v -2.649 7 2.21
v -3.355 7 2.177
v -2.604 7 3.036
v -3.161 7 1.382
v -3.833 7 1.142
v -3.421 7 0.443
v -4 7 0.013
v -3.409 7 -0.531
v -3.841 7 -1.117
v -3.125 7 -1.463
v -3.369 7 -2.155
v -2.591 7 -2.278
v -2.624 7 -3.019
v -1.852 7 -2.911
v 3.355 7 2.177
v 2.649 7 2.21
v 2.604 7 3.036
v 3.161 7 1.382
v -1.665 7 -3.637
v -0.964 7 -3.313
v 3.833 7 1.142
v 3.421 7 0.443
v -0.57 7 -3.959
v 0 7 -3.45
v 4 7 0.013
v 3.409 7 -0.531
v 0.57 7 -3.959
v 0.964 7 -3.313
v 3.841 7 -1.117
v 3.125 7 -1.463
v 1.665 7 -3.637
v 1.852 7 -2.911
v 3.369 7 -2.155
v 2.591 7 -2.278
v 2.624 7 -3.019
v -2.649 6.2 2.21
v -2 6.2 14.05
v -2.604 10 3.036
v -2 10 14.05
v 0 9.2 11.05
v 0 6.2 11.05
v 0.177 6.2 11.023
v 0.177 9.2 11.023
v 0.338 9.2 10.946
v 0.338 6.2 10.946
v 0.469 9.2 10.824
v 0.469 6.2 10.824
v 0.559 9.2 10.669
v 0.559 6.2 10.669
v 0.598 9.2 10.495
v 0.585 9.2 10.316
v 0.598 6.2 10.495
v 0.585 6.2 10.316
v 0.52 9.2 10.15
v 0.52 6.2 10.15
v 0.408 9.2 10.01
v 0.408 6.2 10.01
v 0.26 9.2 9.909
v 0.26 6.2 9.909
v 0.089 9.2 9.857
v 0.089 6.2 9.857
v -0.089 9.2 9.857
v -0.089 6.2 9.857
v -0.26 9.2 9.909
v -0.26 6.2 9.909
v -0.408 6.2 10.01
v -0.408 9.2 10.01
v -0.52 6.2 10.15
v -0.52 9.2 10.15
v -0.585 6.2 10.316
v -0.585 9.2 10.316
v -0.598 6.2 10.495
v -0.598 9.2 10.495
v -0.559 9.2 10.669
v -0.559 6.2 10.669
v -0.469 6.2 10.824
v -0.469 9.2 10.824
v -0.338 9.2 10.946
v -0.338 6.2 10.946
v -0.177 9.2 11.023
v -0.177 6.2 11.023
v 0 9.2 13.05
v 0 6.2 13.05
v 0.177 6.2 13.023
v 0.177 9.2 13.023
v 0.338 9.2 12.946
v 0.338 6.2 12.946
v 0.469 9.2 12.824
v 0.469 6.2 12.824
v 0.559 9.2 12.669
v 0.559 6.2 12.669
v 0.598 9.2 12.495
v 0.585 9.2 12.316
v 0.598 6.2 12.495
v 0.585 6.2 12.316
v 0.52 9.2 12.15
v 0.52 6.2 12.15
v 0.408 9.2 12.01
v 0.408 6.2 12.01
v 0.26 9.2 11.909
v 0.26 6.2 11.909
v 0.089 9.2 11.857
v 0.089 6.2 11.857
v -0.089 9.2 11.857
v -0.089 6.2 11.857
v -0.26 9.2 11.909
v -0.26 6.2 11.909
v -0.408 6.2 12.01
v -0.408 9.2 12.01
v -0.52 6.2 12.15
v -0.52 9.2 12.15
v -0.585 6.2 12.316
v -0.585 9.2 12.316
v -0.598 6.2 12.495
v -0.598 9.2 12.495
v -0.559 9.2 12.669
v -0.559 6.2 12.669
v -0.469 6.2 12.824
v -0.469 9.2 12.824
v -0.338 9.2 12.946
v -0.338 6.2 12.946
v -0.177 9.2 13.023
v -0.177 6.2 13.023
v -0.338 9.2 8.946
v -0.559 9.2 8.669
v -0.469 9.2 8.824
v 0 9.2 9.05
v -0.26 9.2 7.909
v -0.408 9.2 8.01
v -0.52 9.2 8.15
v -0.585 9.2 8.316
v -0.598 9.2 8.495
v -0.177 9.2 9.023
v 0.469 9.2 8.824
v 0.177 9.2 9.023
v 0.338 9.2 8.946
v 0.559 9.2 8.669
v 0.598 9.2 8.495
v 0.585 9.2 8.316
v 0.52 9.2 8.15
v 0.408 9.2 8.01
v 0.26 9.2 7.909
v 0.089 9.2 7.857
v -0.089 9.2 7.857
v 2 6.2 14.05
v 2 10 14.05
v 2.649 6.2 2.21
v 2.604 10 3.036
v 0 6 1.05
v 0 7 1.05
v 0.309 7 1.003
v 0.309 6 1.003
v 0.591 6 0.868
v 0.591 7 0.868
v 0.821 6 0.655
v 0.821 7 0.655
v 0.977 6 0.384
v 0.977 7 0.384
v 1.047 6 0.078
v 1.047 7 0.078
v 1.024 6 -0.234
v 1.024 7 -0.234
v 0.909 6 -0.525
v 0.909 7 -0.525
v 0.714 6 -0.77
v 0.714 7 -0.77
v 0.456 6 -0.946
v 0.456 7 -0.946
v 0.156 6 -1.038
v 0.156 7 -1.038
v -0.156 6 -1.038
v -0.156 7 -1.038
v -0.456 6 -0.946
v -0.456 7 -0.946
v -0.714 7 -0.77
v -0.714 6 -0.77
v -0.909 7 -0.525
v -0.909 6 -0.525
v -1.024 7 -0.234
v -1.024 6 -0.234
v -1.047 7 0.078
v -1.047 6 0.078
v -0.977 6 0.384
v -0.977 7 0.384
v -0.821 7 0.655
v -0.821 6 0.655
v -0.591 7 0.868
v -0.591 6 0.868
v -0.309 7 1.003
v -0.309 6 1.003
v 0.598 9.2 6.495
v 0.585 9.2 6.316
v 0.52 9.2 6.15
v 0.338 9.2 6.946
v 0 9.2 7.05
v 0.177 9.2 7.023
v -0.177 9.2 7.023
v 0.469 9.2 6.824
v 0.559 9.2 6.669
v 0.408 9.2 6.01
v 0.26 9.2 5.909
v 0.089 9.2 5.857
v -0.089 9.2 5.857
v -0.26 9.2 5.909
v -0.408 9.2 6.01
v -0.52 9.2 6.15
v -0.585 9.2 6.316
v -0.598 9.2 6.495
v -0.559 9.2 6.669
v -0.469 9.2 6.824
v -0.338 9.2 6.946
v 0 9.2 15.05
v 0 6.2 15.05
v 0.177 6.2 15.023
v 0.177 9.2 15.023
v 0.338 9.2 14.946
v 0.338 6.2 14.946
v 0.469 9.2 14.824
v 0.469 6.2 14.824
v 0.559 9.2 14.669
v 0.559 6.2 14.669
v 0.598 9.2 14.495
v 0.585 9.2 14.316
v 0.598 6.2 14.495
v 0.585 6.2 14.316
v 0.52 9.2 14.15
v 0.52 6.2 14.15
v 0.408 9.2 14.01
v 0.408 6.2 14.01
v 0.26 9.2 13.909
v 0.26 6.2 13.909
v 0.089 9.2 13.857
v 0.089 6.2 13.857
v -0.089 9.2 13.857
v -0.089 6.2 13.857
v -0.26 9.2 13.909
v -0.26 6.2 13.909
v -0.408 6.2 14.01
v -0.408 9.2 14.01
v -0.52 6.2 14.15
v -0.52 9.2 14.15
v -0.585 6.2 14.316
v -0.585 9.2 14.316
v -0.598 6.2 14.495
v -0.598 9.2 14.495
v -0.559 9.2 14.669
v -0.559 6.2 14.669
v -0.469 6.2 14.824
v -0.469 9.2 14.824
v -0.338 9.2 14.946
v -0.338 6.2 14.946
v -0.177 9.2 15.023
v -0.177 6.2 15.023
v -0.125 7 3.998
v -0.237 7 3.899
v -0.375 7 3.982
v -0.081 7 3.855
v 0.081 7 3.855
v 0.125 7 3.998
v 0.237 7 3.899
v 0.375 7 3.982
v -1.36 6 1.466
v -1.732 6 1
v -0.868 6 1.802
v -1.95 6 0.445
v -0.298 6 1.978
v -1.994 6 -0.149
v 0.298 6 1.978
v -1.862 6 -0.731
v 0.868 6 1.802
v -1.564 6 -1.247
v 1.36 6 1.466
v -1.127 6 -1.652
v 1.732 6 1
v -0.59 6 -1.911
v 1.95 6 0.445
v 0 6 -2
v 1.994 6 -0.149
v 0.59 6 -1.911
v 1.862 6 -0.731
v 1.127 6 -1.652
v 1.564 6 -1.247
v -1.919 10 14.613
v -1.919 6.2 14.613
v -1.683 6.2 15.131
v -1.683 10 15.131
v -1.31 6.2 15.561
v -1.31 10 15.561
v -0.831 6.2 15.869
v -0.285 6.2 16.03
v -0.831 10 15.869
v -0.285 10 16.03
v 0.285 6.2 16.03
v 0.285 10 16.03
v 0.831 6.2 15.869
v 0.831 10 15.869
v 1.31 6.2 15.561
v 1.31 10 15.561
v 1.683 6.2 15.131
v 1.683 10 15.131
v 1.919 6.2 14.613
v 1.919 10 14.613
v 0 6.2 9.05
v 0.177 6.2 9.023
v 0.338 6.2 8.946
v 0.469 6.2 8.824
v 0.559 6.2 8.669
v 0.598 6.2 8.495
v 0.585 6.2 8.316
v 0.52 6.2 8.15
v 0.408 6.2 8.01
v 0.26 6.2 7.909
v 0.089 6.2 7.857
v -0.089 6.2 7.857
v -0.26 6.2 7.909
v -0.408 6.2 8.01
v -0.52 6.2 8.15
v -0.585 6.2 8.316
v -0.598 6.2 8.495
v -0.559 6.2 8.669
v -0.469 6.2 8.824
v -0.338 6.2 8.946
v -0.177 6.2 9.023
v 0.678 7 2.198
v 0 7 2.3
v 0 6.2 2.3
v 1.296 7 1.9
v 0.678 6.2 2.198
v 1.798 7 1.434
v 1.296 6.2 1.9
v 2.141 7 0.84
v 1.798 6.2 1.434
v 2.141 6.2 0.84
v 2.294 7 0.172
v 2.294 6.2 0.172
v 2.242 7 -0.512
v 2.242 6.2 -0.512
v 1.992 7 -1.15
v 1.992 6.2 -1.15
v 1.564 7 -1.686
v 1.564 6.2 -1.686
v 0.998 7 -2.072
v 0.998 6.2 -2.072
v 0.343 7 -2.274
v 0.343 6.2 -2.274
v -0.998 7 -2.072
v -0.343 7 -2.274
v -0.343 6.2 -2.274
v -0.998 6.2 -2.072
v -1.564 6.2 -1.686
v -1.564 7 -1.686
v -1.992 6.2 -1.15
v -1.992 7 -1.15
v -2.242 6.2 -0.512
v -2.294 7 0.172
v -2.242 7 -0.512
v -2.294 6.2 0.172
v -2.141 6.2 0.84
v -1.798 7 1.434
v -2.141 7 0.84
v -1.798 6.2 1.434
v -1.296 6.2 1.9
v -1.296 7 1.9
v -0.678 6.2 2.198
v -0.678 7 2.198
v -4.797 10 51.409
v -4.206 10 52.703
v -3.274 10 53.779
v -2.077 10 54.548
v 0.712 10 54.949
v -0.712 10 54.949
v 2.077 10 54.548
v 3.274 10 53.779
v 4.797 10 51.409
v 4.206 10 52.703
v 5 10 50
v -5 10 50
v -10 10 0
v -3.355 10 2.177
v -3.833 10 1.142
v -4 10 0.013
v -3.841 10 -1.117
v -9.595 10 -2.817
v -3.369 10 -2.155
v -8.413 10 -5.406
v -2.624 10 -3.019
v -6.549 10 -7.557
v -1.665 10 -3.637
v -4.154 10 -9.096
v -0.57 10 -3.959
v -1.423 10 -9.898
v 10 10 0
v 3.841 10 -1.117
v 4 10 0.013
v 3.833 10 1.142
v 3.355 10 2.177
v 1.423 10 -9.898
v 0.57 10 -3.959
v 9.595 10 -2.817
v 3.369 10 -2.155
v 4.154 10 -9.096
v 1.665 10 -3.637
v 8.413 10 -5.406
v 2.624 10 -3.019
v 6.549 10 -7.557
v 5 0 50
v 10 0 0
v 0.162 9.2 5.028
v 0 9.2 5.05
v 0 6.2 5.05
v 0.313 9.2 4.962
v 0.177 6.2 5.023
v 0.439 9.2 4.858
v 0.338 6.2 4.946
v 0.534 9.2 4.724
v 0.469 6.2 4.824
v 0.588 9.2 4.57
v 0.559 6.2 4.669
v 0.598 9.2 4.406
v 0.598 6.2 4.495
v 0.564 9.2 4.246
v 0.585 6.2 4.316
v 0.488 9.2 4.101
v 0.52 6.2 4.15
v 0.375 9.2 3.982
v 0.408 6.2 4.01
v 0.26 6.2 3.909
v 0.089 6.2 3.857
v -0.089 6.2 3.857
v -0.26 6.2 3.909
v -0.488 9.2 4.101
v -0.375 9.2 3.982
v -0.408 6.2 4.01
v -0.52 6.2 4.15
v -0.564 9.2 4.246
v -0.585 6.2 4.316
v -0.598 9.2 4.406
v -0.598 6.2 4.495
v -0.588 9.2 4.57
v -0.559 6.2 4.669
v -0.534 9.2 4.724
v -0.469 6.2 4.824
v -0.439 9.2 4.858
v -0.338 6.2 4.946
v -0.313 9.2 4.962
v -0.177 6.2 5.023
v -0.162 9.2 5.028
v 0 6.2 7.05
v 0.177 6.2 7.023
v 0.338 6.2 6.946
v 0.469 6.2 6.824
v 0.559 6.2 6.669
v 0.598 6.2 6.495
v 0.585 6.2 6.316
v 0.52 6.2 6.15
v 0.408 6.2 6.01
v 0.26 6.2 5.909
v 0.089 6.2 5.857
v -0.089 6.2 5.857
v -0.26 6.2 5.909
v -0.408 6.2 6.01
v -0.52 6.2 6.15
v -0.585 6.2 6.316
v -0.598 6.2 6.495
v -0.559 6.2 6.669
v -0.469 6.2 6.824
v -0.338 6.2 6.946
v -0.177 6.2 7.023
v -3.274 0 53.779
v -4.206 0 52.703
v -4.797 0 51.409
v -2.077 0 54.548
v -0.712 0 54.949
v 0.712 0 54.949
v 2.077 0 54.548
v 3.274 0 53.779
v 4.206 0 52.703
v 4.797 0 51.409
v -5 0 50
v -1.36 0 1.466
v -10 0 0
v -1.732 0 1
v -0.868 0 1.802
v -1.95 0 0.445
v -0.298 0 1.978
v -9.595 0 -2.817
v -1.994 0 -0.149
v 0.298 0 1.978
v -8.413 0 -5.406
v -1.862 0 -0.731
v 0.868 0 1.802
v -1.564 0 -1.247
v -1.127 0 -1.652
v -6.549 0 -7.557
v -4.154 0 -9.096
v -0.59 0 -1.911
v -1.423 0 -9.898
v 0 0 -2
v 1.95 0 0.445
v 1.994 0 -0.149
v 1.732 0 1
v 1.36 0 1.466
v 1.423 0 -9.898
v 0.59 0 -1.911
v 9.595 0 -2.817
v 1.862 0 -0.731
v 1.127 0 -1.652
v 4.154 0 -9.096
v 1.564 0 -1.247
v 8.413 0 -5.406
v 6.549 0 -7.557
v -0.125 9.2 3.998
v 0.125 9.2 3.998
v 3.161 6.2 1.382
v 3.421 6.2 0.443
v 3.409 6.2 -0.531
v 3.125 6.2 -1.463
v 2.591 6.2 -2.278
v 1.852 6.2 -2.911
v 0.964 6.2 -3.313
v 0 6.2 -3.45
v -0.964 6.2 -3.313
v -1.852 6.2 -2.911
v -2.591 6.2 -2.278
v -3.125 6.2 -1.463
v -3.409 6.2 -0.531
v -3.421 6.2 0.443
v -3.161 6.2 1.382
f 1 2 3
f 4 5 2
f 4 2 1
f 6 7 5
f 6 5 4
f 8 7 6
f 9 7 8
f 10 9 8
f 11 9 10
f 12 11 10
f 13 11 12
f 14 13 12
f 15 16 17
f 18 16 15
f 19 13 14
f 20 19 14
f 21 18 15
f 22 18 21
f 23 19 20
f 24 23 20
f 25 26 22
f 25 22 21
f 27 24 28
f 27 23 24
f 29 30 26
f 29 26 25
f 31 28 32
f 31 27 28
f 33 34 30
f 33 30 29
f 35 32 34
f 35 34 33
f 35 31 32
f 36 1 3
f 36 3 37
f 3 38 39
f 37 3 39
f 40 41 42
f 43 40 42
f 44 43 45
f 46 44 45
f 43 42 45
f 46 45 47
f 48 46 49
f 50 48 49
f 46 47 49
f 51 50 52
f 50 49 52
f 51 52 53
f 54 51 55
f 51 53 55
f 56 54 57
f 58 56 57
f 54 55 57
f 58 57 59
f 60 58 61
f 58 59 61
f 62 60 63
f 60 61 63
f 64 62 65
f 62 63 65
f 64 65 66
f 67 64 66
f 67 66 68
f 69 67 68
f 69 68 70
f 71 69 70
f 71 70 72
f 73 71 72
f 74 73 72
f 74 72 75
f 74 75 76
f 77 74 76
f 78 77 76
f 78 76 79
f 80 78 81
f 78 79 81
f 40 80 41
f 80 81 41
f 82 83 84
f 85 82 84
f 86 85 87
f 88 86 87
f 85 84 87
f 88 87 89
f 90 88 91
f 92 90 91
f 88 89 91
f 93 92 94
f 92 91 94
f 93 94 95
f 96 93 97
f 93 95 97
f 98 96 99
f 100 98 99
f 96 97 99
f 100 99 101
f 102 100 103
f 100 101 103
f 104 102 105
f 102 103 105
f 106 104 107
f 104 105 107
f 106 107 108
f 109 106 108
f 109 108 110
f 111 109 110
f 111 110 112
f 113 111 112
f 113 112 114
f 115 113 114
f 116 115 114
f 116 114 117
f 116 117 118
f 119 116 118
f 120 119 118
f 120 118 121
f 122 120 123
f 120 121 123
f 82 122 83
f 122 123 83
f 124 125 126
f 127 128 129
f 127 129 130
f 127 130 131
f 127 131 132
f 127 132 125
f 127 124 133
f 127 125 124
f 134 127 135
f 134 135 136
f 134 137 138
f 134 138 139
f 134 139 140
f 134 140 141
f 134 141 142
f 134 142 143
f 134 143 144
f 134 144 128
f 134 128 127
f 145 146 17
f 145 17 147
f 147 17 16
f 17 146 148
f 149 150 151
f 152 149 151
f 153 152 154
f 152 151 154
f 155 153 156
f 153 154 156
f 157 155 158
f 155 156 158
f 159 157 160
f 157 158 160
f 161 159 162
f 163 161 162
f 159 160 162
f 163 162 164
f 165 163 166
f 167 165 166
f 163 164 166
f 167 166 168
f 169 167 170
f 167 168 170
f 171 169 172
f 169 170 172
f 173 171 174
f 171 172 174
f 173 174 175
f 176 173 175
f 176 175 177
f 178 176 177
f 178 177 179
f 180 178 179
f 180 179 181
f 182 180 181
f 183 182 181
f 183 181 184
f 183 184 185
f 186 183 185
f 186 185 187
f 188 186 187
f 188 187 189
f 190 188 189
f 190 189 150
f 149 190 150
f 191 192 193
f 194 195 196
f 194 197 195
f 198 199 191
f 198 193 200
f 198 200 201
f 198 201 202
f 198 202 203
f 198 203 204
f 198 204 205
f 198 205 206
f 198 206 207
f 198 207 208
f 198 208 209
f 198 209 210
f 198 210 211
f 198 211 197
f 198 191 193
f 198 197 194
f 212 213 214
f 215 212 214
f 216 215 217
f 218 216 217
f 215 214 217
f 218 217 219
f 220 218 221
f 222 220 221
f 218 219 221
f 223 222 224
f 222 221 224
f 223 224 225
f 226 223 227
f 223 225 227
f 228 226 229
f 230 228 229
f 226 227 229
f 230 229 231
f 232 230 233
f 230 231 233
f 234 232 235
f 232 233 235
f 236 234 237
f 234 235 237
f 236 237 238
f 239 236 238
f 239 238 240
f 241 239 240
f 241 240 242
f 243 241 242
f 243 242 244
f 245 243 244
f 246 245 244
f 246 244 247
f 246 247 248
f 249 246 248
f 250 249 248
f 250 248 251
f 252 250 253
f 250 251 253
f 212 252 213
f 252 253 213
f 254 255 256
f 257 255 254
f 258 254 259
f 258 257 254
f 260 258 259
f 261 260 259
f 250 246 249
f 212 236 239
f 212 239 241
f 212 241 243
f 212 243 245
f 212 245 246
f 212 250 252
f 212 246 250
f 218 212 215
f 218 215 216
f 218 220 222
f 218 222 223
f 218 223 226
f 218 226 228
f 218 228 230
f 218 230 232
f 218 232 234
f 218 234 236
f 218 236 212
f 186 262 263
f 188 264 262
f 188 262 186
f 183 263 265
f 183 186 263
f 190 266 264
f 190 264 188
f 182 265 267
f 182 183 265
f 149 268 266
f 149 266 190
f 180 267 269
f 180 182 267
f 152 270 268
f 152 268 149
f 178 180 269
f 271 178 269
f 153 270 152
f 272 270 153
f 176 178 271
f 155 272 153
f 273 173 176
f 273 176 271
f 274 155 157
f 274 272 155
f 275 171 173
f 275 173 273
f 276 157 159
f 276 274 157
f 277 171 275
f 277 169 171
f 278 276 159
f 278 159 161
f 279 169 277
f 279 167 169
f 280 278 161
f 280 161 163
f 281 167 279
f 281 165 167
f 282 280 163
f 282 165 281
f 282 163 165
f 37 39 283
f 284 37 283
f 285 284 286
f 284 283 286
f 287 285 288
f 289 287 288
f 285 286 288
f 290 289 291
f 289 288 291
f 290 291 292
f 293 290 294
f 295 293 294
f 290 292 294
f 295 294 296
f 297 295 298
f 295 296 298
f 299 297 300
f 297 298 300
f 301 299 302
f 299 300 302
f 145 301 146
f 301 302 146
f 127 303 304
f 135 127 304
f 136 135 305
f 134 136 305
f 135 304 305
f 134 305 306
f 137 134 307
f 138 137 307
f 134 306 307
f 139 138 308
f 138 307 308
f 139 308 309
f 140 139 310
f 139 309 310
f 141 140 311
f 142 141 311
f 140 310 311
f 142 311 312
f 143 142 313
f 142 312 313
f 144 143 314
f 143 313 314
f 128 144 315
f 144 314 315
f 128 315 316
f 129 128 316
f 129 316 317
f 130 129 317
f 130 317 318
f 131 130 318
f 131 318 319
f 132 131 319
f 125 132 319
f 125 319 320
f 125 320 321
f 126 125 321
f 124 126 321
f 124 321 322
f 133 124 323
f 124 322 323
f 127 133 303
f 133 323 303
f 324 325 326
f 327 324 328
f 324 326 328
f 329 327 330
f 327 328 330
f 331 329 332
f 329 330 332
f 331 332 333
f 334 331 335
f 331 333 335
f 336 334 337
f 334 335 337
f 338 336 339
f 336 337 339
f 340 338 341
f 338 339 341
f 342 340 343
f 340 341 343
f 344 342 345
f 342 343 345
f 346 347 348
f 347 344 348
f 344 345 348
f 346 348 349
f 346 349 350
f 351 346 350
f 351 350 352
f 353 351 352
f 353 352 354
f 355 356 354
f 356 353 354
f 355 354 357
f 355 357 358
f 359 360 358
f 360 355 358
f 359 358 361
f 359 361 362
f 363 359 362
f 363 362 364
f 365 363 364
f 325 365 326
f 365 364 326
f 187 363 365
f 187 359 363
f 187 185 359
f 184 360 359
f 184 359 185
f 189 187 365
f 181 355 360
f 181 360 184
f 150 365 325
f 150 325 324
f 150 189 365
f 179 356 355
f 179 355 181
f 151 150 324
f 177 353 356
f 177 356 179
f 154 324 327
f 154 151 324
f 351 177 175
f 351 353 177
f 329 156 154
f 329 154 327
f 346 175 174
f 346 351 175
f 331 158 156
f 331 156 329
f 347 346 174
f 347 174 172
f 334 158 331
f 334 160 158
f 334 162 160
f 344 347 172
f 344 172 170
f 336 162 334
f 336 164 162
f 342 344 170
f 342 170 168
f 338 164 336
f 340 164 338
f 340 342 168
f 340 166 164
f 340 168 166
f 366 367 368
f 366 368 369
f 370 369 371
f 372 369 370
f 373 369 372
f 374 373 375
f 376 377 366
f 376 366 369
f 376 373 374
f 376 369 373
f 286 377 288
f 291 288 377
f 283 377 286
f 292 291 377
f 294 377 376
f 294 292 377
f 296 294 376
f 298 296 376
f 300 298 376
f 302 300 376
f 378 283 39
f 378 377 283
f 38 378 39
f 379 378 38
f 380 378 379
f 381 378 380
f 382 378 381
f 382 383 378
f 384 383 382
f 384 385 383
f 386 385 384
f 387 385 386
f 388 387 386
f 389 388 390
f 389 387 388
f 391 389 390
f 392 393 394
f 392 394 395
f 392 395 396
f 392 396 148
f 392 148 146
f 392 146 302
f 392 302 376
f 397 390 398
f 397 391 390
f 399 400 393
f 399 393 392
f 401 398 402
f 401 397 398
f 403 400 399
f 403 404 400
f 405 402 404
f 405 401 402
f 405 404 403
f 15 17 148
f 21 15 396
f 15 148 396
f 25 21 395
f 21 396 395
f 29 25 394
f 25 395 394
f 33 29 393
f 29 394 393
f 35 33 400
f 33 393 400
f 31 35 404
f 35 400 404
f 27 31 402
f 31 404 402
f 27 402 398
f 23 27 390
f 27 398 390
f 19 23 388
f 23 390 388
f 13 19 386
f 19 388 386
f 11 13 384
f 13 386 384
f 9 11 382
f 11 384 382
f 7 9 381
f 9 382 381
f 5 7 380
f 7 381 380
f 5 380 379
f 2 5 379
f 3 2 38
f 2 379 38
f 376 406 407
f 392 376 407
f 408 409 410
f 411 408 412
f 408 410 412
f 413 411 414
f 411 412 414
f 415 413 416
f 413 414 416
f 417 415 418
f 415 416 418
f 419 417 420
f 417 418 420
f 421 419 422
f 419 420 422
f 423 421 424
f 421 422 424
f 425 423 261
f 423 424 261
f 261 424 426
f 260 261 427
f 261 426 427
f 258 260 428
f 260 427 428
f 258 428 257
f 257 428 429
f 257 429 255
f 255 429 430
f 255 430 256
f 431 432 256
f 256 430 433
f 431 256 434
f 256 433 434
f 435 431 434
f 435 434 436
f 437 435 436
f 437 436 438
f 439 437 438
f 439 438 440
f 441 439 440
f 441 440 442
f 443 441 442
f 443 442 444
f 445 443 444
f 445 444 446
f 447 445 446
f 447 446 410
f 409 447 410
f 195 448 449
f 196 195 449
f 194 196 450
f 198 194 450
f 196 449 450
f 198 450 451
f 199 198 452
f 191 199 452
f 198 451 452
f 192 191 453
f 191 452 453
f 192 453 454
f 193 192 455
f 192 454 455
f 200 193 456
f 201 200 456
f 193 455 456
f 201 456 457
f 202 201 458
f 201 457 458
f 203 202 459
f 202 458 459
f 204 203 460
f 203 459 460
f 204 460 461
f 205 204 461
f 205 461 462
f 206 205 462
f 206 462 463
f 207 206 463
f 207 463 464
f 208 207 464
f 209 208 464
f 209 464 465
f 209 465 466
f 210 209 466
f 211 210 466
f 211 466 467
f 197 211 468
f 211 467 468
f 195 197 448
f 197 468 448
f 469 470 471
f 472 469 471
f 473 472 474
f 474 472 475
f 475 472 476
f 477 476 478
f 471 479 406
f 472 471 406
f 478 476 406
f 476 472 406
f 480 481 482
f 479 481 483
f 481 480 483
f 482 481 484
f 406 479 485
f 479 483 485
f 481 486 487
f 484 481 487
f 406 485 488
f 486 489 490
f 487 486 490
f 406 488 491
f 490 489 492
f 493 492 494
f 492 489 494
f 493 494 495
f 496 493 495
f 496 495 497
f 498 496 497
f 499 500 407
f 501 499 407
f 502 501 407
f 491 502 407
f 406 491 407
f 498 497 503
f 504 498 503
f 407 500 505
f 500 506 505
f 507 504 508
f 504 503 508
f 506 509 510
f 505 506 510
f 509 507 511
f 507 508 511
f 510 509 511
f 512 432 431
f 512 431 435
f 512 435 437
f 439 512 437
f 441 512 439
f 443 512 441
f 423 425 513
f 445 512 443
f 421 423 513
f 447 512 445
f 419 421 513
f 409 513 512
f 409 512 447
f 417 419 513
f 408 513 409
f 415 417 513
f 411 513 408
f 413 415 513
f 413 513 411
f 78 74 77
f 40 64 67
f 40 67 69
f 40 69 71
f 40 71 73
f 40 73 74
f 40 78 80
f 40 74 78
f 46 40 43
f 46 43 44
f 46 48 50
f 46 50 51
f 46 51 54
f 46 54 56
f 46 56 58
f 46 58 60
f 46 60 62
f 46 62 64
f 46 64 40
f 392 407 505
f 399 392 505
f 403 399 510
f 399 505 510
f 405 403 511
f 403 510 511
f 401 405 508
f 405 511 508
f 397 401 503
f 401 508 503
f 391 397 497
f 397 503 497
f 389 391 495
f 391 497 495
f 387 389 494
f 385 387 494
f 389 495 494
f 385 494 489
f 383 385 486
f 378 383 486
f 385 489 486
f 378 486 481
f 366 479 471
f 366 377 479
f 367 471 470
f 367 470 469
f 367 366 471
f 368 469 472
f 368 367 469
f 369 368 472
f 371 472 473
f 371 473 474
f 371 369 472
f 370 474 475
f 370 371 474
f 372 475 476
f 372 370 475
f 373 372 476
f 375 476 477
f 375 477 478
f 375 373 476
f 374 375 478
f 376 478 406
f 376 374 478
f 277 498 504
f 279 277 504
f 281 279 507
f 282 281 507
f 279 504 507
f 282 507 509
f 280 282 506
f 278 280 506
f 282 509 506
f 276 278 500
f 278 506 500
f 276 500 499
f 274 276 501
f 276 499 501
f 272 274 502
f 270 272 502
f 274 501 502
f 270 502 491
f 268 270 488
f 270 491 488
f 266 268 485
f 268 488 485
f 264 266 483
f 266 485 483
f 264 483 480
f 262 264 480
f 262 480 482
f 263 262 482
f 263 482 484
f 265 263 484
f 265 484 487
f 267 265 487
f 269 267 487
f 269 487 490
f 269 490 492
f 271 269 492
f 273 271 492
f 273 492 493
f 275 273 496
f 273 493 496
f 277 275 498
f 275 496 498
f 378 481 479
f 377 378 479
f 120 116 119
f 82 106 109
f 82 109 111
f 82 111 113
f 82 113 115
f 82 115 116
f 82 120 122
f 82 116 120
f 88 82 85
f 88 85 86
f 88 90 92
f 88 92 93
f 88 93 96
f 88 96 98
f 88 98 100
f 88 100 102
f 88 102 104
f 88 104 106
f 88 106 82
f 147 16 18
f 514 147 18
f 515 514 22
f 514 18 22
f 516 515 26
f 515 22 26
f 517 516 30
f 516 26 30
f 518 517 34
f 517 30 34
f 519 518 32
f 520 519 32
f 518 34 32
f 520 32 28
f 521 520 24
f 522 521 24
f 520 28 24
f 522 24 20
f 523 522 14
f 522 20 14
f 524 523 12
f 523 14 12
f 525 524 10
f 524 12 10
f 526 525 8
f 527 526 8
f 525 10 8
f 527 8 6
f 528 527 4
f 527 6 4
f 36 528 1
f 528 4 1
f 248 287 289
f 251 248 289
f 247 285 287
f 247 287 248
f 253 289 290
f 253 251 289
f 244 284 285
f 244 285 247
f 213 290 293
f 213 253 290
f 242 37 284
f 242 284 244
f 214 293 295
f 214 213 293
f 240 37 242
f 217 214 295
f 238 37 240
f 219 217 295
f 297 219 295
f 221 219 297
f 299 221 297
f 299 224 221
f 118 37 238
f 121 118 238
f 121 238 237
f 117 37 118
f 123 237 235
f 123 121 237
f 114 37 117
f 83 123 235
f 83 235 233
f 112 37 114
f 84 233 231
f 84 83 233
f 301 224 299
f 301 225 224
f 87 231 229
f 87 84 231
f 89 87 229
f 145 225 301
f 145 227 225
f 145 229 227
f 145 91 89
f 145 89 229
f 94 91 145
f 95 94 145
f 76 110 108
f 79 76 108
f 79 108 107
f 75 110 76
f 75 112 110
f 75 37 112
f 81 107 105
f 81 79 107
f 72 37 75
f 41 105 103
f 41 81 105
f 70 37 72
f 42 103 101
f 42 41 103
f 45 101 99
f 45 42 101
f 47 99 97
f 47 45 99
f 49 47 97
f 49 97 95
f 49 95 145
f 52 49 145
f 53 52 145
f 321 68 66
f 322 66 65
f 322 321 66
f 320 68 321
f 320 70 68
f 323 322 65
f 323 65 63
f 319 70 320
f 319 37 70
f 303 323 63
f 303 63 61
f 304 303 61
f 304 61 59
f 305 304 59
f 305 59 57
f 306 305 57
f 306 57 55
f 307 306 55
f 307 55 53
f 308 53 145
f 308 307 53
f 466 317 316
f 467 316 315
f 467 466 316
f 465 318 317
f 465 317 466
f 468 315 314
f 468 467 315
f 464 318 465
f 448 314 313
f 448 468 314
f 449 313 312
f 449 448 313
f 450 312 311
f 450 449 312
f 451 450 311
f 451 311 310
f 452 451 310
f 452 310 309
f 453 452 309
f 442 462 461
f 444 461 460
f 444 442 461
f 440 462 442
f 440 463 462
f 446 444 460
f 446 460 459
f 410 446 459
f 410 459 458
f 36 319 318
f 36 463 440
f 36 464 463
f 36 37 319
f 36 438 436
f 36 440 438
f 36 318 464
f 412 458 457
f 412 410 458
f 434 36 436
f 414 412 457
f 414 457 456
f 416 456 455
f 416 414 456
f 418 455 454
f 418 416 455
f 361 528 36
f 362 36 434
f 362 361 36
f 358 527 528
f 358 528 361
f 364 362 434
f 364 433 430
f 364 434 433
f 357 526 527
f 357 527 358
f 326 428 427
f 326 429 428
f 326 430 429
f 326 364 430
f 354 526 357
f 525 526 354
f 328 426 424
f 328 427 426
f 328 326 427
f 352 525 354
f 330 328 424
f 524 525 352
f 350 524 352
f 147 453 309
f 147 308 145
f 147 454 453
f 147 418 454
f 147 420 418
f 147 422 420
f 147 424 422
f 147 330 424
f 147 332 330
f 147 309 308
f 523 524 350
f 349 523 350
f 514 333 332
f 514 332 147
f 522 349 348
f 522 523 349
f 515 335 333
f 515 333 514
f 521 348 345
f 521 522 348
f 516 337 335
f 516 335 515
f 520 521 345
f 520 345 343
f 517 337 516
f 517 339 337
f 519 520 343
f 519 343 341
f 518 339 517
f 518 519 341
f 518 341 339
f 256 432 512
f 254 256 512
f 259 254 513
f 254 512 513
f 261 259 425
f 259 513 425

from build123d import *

# Parameters (mm, degrees)
BOSS_EXTRUDE1_DEPTH = 10
CUT_EXTRUDE1_DEPTH  = 3.8
SKETCH6_R           = 2.3
BOSS_EXTRUDE2_DEPTH = 1
SKETCH7_R           = 1.05
CUT_EXTRUDE2_DEPTH  = 57.699667466
SKETCH8_R           = 0.6
BOSS_EXTRUDE3_DEPTH = 3
SKETCH9_R           = 2
CUT_EXTRUDE4_DEPTH  = 6
SKETCH10_R          = 3.99955369
CUT_EXTRUDE7_DEPTH  = 3
CUT_EXTRUDE8_DEPTH  = 58.122782589
SKETCH15_R          = 5
BOSS_EXTRUDE4_DEPTH = 10


# Read off the part's stored shape, not the designer's step: Boss-Extrude1
with BuildPart() as part:
    # Boss-Extrude1 outline → Boss-Extrude1 (new body)
    with BuildSketch(Plane(origin=(0, 0, 0), x_dir=(1, 0, 0), z_dir=(0, 1, 0))):
        with BuildLine():
            Line((5, -55.344368806), (5, -50))
            Line((5, -50), (10, 0))
            ThreePointArc((10, 0), (0, 10), (-10, 0))
            Line((-10, 0), (-5, -50))
            Line((-5, -50), (-10.000656588, -52.844368806))
            Line((-10.000656588, -52.844368806), (-10.000656588, -55.344368806))
            Line((-10.000656588, -55.344368806), (5, -55.344368806))
        make_face()
    extrude(amount=BOSS_EXTRUDE1_DEPTH)

    # Sketch5 → Cut-Extrude1 (cut)
    with BuildSketch(Plane(origin=(0, 10, 0), x_dir=(1, 0, 0), z_dir=(0, 1, 0))):
        with BuildLine():
            Line((2, -14.05), (2.649226302, -2.21))
            ThreePointArc((2.649226302, -2.21), (0, 3.45), (-2.649226302, -2.21))
            Line((-2.649226302, -2.21), (-2, -14.05))
            ThreePointArc((-2, -14.05), (0, -16.05), (2, -14.05))
        make_face()
    extrude(amount=-CUT_EXTRUDE1_DEPTH, mode=Mode.SUBTRACT)

    # Sketch6 → Boss-Extrude2 (add)
    with BuildSketch(Plane(origin=(0, 6.2, 0), x_dir=(1, 0, 0), z_dir=(0, 1, 0))):
        with Locations(Location((0, 0, 0), (0, 0, 270))):
            Circle(SKETCH6_R)
    extrude(amount=BOSS_EXTRUDE2_DEPTH)

    # Sketch7 → Cut-Extrude2 (cut, through all)
    with BuildSketch(Plane(origin=(0, 7.2, 0), x_dir=(1, 0, 0), z_dir=(0, 1, 0))):
        with Locations(Location((0, 0, 0), (0, 0, 270))):
            Circle(SKETCH7_R)
    extrude(amount=-CUT_EXTRUDE2_DEPTH, mode=Mode.SUBTRACT)

    # Sketch8 → Boss-Extrude3 (add)
    with BuildSketch(Plane(origin=(0, 6.2, 0), x_dir=(1, 0, 0), z_dir=(0, 1, 0))):
        with Locations(Location((0, -4.45, 0), (0, 0, 270))):
            Circle(SKETCH8_R)
        with Locations(Location((0, -6.45, 0), (0, 0, 270))):
            Circle(SKETCH8_R)
        with Locations(Location((0, -8.45, 0), (0, 0, 270))):
            Circle(SKETCH8_R)
        with Locations(Location((0, -10.45, 0), (0, 0, 270))):
            Circle(SKETCH8_R)
        with Locations(Location((0, -12.45, 0), (0, 0, 270))):
            Circle(SKETCH8_R)
        with Locations(Location((0, -14.45, 0), (0, 0, 270))):
            Circle(SKETCH8_R)
    extrude(amount=BOSS_EXTRUDE3_DEPTH)

    # Sketch9 → Cut-Extrude4 (cut)
    with BuildSketch(Plane.XZ):
        with Locations(Location((0, 0, 0), (0, 0, 270))):
            Circle(SKETCH9_R)
    extrude(amount=-CUT_EXTRUDE4_DEPTH, mode=Mode.SUBTRACT)

    # Sketch10 → Cut-Extrude7 (cut)
    with BuildSketch(Plane(origin=(0, 10, 0), x_dir=(1, 0, 0), z_dir=(0, 1, 0))):
        Circle(SKETCH10_R)
    extrude(amount=-CUT_EXTRUDE7_DEPTH, mode=Mode.SUBTRACT)

    # Sketch14 → Cut-Extrude8 (cut, through all)
    with BuildSketch(Plane(origin=(0, 10, 0), x_dir=(1, 0, 0), z_dir=(0, 1, 0))):
        Polygon((-5, -50), (5, -50), (5, -55.344368806), (-10.000656588, -55.344368806), (-10.000656588, -52.844368806), align=None)
    extrude(amount=-CUT_EXTRUDE8_DEPTH, mode=Mode.SUBTRACT)

    # Sketch15 → Boss-Extrude4 (add)
    with BuildSketch(Plane(origin=(0, 10, 0), x_dir=(1, 0, 0), z_dir=(0, 1, 0))):
        with Locations((0, -50)):
            Circle(SKETCH15_R)
    extrude(amount=-BOSS_EXTRUDE4_DEPTH)


solid = part.part
